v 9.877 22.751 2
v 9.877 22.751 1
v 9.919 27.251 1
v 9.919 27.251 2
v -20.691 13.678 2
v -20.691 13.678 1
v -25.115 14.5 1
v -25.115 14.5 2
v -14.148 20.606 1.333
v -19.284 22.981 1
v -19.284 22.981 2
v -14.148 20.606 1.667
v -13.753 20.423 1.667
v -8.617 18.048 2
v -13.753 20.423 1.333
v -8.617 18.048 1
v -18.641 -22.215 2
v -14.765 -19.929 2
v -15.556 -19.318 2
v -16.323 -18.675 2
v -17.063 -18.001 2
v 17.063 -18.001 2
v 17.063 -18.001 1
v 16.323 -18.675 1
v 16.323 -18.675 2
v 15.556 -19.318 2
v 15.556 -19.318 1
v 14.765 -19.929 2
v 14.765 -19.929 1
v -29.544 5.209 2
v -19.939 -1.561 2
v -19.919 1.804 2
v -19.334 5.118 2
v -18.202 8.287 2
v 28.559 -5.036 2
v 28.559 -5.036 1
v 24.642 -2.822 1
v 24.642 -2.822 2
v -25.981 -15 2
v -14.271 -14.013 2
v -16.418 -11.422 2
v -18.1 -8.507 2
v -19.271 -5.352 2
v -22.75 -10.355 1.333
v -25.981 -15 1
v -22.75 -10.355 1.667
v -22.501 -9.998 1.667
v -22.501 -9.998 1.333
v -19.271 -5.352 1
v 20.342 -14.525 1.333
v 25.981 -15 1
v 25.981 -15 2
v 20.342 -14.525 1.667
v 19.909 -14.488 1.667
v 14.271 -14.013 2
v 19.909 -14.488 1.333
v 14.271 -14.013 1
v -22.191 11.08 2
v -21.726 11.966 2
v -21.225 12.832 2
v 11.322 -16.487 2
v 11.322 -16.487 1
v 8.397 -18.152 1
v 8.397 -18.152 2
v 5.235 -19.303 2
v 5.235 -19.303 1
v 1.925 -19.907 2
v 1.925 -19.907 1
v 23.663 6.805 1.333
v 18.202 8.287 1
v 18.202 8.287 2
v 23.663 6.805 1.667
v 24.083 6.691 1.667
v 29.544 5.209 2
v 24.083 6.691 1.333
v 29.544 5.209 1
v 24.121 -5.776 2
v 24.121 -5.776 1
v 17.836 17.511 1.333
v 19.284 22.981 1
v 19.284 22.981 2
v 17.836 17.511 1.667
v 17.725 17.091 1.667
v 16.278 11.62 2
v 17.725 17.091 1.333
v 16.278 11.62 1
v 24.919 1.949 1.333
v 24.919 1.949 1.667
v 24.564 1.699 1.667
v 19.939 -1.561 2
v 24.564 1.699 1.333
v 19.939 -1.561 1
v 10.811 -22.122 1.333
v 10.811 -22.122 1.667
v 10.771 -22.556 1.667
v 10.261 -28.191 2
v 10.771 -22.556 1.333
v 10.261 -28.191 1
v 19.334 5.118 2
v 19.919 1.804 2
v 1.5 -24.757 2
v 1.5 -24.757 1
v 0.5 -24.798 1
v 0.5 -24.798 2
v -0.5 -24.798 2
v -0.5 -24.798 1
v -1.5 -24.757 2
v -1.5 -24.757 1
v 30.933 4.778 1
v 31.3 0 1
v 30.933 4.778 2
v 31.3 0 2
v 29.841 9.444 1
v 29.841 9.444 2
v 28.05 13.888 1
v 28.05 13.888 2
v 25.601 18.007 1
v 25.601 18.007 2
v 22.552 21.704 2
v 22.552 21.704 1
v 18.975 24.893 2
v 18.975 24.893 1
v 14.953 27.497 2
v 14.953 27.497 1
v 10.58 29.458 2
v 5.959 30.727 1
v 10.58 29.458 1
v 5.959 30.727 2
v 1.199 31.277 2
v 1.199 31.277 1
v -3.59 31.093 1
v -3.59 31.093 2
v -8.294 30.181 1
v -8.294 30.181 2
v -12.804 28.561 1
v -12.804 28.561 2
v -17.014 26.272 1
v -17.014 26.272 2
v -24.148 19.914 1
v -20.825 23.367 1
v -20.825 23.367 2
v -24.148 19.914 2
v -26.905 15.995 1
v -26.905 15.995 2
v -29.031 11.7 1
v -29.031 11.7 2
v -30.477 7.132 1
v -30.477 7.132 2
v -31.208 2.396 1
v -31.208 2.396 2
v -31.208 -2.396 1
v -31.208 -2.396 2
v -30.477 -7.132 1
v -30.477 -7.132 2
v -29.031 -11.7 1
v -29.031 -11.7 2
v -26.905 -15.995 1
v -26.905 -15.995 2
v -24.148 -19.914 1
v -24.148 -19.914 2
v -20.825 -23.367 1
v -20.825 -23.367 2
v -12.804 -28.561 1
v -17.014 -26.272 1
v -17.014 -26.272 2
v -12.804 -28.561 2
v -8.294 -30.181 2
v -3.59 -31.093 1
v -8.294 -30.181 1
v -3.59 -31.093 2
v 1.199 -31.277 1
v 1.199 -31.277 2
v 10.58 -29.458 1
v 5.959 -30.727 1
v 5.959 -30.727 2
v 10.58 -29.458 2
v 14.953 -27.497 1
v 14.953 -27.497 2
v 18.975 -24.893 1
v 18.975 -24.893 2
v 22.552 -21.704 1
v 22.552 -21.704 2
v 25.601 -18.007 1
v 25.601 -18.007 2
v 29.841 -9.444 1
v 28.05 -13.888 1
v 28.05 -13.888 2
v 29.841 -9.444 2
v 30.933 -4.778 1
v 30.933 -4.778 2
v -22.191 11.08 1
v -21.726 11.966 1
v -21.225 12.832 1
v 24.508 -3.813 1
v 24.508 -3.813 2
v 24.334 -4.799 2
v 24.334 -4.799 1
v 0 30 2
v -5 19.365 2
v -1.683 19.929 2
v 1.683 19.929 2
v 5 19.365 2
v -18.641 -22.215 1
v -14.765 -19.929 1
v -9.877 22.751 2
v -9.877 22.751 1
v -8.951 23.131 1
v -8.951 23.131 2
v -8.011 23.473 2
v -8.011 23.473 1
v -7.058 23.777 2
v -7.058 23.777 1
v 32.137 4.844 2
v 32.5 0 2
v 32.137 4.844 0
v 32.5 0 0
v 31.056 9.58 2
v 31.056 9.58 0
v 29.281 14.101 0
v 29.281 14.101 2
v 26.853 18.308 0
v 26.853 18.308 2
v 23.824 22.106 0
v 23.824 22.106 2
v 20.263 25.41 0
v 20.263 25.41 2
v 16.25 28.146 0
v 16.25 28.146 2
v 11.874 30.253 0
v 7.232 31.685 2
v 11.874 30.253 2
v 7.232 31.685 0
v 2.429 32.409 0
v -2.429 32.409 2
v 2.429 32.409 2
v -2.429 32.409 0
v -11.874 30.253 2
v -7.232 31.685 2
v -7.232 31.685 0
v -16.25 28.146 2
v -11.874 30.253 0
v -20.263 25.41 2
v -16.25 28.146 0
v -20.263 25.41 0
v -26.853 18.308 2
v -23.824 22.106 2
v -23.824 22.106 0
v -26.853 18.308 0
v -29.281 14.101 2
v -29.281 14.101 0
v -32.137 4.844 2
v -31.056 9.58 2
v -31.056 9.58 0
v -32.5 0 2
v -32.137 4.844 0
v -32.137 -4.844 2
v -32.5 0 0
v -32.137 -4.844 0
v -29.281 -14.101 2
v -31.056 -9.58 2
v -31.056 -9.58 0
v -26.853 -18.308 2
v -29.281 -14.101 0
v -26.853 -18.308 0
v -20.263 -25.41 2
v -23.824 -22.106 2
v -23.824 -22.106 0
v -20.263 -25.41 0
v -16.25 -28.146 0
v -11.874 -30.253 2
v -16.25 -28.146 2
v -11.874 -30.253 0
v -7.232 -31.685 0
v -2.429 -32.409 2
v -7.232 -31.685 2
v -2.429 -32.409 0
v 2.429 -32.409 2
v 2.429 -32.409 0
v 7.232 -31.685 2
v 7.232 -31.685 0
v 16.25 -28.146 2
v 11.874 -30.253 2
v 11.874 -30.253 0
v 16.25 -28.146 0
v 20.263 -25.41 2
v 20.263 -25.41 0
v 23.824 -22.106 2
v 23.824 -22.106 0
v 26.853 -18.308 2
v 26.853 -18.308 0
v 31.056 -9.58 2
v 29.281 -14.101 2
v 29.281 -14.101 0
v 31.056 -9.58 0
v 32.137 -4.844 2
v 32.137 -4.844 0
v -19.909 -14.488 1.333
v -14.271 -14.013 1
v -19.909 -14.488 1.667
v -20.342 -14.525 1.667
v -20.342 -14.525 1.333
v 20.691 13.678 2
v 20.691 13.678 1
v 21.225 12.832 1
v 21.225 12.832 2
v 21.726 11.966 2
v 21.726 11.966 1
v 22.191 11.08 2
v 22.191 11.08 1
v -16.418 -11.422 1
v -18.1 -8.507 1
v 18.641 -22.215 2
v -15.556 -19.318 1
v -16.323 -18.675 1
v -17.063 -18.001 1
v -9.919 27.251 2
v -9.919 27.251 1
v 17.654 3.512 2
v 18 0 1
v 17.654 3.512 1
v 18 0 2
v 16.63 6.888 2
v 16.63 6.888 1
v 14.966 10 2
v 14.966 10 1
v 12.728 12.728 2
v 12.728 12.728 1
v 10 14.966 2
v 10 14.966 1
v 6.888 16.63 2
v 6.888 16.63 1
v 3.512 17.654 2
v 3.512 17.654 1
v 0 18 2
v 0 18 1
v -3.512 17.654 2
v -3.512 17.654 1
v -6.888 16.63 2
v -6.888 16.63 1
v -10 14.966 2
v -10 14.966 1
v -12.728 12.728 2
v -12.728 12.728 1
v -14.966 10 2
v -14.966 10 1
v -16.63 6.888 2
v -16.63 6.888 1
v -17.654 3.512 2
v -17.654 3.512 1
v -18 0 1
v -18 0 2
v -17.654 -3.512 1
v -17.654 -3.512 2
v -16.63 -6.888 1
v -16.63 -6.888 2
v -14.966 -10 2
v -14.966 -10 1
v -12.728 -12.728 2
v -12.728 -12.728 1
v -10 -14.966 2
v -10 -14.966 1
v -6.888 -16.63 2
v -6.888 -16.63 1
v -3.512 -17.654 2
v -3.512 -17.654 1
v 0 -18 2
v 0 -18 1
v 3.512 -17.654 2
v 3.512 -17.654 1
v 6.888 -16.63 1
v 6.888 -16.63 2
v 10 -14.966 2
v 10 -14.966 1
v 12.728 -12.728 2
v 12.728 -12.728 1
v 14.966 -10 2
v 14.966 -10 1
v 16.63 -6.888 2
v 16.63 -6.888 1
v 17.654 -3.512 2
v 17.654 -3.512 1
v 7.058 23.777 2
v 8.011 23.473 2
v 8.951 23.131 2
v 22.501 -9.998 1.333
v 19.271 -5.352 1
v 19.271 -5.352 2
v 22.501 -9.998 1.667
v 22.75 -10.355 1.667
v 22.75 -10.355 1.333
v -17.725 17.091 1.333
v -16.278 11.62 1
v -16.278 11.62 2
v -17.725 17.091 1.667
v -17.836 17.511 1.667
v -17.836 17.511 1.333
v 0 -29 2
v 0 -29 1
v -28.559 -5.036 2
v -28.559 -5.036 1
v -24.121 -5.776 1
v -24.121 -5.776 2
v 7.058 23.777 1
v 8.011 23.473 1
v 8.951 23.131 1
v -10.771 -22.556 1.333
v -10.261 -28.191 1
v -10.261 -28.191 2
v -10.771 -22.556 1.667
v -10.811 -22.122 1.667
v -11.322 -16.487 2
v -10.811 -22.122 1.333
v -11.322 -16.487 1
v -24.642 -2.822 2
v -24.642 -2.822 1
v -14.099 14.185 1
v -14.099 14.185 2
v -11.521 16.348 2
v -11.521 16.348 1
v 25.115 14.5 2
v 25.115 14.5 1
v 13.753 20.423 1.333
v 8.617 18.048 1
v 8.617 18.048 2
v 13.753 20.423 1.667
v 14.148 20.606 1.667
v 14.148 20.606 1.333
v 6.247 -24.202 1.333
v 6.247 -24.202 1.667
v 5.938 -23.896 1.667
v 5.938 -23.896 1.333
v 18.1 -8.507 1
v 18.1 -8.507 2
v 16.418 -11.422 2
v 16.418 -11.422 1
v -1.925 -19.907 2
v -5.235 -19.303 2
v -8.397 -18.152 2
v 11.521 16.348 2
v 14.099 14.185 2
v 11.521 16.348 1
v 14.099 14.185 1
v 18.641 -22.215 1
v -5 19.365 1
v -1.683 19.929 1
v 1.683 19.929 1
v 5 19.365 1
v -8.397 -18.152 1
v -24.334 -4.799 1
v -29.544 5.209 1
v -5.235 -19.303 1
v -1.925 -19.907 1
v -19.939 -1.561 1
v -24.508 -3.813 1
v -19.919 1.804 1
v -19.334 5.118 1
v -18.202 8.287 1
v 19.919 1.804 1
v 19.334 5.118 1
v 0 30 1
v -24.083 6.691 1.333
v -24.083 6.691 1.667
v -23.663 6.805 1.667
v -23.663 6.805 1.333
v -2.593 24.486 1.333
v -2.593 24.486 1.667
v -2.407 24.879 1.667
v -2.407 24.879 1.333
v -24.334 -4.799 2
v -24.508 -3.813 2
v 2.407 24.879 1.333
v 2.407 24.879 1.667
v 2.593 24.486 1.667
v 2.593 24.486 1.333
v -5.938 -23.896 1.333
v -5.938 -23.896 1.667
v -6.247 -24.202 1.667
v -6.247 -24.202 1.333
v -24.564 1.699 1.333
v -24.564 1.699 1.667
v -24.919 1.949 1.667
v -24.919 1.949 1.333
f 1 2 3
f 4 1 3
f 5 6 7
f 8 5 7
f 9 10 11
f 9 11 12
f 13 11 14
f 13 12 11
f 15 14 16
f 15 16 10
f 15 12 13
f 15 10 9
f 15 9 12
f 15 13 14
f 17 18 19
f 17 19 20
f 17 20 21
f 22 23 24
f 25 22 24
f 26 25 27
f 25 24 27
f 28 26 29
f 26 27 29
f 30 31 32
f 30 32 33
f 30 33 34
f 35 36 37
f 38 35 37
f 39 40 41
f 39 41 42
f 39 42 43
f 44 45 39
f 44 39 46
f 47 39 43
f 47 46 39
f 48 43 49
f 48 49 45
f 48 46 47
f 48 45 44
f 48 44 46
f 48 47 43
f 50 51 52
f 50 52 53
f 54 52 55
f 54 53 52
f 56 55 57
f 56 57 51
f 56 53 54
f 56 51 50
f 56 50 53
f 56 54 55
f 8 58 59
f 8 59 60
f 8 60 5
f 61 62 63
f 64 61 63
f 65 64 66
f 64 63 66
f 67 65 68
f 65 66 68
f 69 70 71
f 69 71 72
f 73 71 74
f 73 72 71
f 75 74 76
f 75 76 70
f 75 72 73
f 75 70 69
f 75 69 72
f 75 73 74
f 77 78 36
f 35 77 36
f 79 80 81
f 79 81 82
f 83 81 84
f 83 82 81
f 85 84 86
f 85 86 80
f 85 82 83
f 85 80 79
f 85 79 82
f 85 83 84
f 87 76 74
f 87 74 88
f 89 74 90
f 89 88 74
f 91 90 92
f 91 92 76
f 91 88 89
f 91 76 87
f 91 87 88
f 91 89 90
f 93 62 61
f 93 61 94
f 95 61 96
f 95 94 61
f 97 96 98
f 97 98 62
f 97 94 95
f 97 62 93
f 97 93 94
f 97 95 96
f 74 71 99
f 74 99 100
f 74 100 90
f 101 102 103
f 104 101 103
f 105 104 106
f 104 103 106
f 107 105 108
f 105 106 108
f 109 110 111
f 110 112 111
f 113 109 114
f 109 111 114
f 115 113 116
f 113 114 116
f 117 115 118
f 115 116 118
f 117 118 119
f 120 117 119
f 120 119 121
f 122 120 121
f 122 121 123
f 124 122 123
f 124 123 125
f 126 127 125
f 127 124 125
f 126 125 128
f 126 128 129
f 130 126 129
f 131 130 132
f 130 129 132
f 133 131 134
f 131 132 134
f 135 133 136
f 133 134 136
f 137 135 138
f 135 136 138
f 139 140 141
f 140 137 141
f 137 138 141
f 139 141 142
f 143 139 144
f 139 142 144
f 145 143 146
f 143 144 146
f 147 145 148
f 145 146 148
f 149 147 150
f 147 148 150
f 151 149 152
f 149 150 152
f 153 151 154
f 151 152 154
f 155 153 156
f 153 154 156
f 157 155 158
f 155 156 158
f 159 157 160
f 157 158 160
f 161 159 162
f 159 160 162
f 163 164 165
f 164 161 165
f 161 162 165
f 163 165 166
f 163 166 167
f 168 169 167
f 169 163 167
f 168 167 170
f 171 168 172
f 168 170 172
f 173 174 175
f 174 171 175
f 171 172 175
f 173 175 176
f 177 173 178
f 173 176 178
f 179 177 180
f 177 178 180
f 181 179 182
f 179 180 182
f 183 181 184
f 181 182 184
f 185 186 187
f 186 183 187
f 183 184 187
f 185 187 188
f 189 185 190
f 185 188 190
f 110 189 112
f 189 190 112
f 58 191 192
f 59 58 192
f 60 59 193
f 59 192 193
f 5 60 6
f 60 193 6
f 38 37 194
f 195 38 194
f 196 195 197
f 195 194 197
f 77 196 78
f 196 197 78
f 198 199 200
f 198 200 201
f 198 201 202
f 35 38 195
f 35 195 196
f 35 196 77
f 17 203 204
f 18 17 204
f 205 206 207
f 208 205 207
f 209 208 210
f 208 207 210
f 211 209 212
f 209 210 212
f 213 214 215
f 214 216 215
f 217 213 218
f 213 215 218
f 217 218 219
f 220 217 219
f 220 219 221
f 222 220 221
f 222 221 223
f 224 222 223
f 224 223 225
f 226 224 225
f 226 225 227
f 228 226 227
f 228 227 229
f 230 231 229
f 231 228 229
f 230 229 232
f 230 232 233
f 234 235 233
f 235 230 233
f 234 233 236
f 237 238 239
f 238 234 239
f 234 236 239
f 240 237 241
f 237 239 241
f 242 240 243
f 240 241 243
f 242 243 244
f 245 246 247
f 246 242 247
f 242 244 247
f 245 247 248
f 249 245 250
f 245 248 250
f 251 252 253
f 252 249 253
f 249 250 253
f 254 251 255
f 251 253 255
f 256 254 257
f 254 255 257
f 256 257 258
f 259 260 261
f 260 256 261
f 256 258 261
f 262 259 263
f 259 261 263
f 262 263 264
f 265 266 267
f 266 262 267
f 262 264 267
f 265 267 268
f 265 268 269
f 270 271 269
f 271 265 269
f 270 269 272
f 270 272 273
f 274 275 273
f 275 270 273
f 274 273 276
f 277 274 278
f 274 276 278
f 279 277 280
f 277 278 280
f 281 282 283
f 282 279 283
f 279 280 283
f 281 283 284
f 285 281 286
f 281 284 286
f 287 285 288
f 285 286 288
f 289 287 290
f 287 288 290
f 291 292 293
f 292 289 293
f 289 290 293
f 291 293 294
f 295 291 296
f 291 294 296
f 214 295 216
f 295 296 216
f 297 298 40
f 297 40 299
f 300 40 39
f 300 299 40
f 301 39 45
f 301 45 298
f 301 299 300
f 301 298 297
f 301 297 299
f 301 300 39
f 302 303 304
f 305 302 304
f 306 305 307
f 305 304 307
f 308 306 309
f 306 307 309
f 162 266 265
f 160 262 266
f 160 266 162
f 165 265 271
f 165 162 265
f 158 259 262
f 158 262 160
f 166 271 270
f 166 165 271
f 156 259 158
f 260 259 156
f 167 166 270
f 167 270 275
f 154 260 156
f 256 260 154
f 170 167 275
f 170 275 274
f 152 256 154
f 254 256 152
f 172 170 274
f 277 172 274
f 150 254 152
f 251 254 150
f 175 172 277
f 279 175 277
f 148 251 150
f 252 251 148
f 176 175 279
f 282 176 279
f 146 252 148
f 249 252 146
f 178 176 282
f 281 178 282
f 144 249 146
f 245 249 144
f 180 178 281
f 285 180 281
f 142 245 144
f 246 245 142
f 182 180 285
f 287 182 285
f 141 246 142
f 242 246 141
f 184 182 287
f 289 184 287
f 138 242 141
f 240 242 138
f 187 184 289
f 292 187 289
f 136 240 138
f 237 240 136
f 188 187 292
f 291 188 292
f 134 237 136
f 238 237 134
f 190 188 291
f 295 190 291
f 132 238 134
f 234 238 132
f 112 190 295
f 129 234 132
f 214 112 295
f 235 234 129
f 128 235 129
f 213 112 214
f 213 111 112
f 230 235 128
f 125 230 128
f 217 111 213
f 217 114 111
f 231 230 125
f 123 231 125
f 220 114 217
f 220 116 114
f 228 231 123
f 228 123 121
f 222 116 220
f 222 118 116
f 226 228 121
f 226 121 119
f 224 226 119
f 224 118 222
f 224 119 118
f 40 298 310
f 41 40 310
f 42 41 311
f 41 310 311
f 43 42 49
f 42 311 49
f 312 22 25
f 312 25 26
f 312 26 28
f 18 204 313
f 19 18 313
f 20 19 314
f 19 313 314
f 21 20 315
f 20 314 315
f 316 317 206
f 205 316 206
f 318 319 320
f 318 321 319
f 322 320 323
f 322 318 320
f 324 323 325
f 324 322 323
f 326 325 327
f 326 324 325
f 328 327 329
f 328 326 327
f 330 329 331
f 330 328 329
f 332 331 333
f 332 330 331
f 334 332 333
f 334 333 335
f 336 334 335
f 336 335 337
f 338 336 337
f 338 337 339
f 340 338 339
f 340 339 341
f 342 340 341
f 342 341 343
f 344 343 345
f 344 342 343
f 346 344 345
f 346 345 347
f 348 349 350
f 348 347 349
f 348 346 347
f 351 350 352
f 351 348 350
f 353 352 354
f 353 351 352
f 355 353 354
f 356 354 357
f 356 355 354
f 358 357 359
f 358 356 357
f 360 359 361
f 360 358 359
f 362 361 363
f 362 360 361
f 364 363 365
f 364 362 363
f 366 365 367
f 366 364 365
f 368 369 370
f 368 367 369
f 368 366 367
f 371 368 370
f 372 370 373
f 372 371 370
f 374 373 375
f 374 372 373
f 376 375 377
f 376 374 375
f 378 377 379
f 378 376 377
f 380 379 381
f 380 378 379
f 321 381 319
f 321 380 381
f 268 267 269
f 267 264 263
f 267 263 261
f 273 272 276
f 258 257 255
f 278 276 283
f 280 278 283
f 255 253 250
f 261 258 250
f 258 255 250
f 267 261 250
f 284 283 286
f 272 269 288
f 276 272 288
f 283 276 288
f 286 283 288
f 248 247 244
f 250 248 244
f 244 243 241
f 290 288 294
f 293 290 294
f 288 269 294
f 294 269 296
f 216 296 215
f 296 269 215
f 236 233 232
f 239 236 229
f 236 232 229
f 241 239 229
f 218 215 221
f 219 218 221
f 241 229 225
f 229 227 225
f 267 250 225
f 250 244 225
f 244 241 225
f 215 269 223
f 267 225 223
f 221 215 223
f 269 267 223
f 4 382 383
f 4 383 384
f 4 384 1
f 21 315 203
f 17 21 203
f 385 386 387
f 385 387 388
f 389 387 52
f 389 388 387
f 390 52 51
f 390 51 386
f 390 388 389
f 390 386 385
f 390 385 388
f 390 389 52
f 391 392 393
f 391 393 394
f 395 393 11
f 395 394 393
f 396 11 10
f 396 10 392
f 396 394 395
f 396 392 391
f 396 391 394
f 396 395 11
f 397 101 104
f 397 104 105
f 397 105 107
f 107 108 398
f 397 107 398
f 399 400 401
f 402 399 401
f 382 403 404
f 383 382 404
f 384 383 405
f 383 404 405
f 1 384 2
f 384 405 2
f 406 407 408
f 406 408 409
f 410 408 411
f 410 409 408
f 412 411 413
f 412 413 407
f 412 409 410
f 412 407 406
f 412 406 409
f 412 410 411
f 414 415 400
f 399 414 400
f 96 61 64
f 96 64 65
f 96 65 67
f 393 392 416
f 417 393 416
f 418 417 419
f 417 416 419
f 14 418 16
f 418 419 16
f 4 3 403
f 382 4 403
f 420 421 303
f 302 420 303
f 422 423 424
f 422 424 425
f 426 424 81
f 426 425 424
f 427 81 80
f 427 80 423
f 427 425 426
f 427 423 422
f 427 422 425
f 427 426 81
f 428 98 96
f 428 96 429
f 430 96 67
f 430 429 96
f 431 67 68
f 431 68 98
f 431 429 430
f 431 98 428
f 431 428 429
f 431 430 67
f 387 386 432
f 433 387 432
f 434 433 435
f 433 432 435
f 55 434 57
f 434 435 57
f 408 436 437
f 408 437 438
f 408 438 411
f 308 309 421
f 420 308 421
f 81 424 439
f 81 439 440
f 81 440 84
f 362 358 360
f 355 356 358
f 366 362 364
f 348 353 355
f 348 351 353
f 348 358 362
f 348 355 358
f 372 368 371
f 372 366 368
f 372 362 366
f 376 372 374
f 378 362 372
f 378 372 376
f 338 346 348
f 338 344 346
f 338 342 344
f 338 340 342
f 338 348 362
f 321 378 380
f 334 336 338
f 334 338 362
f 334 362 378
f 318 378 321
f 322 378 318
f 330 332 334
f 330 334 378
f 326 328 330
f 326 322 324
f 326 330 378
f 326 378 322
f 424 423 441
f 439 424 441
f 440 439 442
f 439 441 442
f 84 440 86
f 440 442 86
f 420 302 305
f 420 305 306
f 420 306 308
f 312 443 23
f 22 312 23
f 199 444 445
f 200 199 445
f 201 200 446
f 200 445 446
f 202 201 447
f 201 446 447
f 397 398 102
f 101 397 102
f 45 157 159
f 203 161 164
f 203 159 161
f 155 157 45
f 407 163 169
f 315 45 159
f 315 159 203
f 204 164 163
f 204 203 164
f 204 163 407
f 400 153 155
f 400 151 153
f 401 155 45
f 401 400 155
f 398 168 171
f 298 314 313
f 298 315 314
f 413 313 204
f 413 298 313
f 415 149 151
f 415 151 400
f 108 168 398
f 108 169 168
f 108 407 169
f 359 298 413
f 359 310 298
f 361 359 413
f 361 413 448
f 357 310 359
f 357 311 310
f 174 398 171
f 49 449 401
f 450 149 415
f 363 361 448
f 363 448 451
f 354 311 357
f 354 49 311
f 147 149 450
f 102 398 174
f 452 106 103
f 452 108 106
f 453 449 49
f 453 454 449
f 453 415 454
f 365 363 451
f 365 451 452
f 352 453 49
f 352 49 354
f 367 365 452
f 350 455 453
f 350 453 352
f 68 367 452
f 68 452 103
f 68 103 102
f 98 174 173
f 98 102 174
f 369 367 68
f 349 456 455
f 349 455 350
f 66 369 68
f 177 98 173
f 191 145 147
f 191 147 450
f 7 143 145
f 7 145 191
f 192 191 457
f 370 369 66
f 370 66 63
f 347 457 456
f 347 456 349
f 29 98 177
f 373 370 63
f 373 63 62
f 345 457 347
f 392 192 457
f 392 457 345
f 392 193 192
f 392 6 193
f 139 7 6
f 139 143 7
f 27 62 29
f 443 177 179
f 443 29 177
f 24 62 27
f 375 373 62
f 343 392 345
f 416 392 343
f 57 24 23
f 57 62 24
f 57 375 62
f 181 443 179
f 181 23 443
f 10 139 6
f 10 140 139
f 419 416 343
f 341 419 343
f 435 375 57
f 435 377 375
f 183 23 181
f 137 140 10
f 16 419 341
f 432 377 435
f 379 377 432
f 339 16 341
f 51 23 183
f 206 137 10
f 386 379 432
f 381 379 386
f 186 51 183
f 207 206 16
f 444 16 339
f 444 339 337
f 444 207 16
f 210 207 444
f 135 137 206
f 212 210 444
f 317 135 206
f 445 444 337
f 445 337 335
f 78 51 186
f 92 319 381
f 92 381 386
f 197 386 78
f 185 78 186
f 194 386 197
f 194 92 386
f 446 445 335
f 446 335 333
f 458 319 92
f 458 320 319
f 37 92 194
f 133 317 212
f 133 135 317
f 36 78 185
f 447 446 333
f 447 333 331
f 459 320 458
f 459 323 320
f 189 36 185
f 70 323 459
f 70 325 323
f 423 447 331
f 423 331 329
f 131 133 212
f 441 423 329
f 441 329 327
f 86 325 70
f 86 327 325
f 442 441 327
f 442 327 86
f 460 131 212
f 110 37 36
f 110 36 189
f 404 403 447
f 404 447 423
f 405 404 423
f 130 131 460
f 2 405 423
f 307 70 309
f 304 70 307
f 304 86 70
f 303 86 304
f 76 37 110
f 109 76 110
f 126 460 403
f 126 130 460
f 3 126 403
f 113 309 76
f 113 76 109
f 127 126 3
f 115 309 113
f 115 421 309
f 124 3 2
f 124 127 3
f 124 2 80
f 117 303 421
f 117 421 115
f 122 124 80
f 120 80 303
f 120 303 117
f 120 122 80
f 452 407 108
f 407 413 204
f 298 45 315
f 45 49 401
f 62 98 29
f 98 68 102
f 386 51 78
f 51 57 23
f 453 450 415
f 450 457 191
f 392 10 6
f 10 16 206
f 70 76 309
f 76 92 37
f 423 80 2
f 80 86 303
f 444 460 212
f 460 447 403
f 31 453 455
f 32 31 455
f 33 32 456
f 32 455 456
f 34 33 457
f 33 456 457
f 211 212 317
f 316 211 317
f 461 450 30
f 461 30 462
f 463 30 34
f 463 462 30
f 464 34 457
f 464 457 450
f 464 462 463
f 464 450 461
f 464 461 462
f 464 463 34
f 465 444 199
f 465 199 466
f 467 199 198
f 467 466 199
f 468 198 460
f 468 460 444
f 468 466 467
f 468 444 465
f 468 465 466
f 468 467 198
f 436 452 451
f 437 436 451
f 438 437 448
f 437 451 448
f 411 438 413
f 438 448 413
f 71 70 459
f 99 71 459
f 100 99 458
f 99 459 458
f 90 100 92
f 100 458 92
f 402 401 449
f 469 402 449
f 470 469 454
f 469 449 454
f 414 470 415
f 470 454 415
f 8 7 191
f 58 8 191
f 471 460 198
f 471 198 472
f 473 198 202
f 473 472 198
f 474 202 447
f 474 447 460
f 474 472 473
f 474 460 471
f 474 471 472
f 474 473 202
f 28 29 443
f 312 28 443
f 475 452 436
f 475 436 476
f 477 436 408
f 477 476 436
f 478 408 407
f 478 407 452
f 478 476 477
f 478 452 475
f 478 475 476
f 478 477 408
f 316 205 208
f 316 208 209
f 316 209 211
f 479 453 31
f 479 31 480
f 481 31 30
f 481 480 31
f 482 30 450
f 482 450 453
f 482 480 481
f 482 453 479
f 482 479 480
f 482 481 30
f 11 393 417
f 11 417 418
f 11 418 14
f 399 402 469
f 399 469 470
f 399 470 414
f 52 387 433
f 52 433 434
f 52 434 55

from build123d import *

# Parameters (mm, degrees)
F0_R     = 32.5
F1_DEPTH = 2
F2_R     = 31.3
F2_R_2   = 18
F3_DEPTH = 1
F5_DEPTH = 1
F6_COUNT = 9


with BuildPart() as f1:
    # F0 (on Top) → F1 (new body)
    with BuildSketch(Plane.XY):
        Circle(F0_R)
    extrude(amount=F1_DEPTH)

    # F2 (on face) → F3 (cut)
    with BuildSketch(Plane.XY.offset(2)):
        Circle(F2_R)
        Circle(F2_R_2, mode=Mode.SUBTRACT)
    extrude(amount=-F3_DEPTH, mode=Mode.SUBTRACT)

    # F4 (on face) → F5 (join, through all)
    with BuildSketch(Plane.XY.offset(1)):
        with BuildLine():
            ThreePointArc((-5, 19.364916731), (0, 20), (5, 19.364916731))
            add(Edge.make_bspline(
                [(0, 30), (5, 19.364916731), (0, 30), (5, 19.364916731)],
                knots=[0, 0, 0, 0, 11.7518082072, 11.7518082072, 11.7518082072, 11.7518082072], degree=3))
            add(Edge.make_bspline(
                [(-5, 19.364916731), (0, 30), (-5, 19.364916731), (0, 30)],
                knots=[0, 0, 0, 0, 11.7518082072, 11.7518082072, 11.7518082072, 11.7518082072], degree=3))
        make_face()
        with BuildLine():
            Line((9.8770545117, 22.7512776415), (9.9185841564, 27.2510860028))
            Line((9.9185841564, 27.2510860028), (7.0579766494, 23.7773380714))
            ThreePointArc((7.0579766494, 23.7773380714), (8.4830430925, 23.3069693448), (9.8770545117, 22.7512776415))
        make_face()
    extrude(amount=F5_DEPTH)

    # F6: F1 ×9 about axis
    f6_axis = Axis((0, 0, 0), (0, 0, -1))


with BuildPart() as f1_1:
    add(f1.part)
    for i in range(1, F6_COUNT):
        add(f1.part.rotate(f6_axis, i * 360 / F6_COUNT))


solid = f1_1.part
